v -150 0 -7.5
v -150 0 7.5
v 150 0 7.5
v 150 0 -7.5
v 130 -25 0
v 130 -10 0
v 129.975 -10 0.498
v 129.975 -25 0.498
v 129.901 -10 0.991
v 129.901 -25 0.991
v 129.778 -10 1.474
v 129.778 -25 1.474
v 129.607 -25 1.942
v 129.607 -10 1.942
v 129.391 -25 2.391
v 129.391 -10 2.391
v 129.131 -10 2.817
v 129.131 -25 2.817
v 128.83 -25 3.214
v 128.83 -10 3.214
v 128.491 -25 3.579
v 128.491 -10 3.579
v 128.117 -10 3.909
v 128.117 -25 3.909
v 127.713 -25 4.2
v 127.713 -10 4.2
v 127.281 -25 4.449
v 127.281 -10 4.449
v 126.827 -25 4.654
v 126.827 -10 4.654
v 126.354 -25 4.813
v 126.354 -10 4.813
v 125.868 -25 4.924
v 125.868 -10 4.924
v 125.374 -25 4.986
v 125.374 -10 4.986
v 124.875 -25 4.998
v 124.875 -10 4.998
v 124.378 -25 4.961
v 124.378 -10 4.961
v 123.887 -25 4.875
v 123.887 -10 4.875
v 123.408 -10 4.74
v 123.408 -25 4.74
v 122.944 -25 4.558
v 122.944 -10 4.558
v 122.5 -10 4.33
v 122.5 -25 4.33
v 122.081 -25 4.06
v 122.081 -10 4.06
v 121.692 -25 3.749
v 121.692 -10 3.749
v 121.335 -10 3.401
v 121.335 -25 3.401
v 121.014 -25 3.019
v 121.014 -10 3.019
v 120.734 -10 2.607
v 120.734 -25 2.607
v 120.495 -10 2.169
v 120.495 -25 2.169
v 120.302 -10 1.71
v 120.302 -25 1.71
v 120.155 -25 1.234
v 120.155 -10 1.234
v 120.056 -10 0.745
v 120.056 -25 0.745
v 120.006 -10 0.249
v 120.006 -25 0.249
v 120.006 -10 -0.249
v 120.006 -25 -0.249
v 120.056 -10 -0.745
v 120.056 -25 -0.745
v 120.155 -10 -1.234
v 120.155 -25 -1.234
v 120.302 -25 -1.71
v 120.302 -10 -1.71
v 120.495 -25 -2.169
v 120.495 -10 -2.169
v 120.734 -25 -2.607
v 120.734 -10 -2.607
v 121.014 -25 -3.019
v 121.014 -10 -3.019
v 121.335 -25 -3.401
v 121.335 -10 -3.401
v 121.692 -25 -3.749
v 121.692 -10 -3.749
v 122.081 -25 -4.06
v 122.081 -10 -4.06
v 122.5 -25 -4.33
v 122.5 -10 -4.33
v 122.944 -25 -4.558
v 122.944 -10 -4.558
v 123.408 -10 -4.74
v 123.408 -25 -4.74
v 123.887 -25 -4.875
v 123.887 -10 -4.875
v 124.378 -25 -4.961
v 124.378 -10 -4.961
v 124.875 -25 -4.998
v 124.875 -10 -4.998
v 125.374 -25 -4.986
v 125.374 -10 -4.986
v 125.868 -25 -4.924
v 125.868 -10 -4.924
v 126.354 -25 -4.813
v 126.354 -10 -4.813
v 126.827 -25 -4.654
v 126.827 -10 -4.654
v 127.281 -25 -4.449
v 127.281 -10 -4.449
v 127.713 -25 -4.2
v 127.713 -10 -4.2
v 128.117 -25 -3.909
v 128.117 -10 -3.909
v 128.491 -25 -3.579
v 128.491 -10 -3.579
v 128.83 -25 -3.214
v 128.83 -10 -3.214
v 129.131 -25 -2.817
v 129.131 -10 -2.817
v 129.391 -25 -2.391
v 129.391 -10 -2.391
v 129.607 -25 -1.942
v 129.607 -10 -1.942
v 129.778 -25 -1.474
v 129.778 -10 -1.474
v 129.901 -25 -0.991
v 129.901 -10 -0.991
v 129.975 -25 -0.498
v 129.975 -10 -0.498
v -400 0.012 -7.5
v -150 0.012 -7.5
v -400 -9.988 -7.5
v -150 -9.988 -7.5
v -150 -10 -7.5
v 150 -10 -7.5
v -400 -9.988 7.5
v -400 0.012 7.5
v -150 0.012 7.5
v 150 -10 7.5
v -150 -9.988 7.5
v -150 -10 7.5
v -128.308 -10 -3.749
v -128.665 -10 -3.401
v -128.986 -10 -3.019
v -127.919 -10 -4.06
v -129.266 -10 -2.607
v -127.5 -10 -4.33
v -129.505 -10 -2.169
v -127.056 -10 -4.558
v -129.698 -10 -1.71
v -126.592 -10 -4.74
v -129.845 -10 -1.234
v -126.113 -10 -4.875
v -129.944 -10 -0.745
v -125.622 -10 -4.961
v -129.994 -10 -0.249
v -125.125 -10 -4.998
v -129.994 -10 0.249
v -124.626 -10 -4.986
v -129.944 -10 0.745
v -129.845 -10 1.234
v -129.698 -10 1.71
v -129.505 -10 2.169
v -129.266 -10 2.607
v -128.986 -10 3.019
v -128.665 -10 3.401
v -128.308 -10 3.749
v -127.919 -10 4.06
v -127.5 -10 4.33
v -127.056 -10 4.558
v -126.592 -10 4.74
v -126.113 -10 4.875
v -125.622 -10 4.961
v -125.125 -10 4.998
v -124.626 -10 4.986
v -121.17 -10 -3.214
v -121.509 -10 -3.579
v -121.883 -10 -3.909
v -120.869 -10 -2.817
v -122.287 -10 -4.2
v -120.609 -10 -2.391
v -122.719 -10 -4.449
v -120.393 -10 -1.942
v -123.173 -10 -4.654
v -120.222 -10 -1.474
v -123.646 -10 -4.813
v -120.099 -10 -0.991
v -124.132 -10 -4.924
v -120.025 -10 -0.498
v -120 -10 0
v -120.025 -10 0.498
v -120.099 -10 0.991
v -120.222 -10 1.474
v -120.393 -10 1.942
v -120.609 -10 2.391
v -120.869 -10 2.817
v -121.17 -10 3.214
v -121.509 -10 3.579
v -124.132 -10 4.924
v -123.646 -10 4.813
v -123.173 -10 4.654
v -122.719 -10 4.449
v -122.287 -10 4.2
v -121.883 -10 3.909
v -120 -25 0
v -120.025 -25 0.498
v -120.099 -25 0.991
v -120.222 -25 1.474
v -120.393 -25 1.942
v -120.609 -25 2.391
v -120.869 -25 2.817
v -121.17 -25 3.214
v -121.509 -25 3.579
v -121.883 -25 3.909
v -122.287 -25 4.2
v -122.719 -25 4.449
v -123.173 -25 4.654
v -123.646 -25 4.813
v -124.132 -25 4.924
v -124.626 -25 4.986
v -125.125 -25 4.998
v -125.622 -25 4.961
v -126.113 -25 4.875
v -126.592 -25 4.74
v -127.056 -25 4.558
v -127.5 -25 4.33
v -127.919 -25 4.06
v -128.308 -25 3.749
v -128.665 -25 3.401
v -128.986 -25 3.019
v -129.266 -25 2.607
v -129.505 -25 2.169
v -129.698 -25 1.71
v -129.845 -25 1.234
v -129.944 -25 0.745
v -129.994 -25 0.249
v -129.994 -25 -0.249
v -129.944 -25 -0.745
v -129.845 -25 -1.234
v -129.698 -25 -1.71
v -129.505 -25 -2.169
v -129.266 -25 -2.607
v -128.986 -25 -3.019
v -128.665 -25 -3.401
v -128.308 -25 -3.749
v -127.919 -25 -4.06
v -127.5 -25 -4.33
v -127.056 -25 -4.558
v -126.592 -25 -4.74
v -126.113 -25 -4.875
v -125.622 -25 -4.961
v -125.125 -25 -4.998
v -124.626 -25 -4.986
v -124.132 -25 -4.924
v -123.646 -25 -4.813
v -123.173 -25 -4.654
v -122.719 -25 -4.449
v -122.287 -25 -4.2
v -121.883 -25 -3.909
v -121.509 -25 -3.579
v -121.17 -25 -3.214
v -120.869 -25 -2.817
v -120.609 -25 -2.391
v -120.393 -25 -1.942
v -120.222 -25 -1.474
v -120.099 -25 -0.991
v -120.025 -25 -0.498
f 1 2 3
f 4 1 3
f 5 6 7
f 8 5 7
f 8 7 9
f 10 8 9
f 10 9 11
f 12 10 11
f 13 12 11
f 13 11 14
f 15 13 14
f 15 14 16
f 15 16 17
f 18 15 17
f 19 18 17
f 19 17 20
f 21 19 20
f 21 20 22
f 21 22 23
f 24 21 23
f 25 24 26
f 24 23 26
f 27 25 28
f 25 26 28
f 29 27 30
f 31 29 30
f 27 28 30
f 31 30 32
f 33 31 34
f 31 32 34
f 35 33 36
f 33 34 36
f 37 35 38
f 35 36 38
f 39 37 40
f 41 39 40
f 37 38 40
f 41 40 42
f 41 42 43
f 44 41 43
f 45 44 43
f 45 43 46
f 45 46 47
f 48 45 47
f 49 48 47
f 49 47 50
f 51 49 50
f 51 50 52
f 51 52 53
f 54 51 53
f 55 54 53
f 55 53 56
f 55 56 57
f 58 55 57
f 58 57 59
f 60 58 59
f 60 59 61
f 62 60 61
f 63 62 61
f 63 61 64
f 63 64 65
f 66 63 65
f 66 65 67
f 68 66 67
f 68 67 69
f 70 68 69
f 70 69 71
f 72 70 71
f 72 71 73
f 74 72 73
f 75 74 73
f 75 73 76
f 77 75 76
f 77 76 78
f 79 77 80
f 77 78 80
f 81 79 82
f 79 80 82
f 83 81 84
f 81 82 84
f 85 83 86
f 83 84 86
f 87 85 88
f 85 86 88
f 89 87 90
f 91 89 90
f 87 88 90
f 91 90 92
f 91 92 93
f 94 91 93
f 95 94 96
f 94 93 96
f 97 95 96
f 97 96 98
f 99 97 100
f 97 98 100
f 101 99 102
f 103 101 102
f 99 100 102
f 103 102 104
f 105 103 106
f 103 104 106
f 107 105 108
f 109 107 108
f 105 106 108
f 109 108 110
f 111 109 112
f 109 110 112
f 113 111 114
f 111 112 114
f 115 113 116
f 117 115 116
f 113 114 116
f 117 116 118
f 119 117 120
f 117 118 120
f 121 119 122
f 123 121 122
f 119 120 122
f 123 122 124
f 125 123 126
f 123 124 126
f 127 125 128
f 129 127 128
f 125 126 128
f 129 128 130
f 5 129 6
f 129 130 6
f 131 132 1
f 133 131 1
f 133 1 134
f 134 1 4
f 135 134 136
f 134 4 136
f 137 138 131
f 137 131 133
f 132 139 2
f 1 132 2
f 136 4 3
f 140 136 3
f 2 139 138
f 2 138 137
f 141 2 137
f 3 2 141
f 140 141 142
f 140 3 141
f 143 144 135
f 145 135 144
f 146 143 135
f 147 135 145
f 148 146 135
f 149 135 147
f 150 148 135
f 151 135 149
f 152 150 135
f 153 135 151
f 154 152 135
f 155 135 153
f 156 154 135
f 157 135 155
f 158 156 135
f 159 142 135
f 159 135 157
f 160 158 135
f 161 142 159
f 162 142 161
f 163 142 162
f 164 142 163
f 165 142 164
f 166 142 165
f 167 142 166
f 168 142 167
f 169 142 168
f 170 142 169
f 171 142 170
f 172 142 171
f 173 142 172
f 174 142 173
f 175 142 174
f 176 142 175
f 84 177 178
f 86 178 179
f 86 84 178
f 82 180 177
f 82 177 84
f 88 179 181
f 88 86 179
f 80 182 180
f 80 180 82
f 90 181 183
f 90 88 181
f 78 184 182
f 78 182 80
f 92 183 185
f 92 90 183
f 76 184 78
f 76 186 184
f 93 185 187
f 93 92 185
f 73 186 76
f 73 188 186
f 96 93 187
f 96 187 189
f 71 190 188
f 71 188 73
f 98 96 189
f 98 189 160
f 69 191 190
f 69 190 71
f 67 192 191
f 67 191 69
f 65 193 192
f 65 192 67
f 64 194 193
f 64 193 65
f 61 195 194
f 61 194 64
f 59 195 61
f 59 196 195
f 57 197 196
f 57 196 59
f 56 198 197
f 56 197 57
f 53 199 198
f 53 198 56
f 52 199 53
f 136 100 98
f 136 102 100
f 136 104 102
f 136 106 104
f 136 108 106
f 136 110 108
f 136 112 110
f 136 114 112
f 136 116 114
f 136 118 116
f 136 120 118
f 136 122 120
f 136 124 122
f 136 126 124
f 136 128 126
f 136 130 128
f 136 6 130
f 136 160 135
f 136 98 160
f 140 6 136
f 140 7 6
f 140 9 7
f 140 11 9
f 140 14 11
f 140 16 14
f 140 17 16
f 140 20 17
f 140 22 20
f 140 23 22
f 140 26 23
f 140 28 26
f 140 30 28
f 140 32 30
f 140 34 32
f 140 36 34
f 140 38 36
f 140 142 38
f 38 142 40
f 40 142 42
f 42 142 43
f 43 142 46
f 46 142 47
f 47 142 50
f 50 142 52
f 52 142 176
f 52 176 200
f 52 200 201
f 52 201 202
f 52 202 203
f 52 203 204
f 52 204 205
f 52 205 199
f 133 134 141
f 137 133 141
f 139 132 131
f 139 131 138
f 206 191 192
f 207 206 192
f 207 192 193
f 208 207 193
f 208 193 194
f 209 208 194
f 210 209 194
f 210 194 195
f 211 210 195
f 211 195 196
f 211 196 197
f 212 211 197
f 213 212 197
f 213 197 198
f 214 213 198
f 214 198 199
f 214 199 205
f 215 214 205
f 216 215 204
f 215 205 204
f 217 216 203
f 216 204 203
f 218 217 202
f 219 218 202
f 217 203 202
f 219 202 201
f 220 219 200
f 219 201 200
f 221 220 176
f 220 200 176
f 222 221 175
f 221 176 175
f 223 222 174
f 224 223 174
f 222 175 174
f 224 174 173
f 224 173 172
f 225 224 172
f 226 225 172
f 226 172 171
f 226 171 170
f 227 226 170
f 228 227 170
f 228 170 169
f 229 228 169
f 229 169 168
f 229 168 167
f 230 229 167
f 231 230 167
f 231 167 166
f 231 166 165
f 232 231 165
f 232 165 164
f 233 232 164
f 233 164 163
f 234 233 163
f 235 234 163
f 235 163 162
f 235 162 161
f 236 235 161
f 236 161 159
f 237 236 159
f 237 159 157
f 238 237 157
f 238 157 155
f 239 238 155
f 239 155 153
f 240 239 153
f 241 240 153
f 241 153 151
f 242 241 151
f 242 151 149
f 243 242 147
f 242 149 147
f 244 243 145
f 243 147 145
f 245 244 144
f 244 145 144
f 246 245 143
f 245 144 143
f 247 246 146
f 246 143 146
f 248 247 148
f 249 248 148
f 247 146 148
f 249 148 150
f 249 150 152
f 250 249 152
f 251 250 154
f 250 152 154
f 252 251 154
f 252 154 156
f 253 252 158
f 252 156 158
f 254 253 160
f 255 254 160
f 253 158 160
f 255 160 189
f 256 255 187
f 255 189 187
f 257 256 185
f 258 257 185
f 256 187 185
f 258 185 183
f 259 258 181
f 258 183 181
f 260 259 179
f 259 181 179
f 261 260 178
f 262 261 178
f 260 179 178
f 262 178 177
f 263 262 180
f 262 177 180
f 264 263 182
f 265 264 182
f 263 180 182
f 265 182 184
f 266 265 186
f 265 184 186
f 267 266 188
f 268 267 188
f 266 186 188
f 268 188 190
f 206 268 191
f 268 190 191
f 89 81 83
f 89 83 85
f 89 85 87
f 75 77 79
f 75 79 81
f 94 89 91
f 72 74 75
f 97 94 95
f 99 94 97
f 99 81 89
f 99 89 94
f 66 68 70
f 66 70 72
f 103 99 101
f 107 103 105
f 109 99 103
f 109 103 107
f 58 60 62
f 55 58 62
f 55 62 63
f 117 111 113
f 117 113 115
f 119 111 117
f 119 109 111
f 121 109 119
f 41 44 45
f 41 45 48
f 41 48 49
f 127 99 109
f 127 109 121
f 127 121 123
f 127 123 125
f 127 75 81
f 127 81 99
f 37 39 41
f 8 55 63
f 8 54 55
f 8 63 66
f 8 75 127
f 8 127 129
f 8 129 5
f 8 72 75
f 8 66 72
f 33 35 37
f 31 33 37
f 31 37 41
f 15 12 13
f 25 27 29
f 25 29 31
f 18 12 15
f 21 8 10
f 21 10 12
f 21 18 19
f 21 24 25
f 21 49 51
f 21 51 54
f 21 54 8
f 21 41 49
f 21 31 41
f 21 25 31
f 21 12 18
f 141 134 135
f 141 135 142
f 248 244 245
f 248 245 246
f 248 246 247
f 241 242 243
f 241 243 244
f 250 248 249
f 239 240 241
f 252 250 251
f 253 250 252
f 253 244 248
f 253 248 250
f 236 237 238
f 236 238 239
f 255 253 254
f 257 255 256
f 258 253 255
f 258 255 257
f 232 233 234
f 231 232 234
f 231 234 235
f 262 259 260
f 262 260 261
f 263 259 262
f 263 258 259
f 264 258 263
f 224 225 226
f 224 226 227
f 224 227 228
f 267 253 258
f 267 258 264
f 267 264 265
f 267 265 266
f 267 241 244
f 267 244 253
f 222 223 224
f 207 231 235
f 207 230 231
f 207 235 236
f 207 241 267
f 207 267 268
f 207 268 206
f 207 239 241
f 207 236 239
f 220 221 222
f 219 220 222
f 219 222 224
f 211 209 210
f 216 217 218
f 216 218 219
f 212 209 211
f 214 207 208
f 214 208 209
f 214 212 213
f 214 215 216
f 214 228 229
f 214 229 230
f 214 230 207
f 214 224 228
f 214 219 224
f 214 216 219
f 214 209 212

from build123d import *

# Parameters (mm, degrees)
F0_W     = 300
F0_H     = 15
F0_R     = 5
F1_DEPTH = 10
F2_DEPTH = 25
F4_W     = 10
F4_H     = 15
F5_DEPTH = 250


with BuildPart() as f1:
    # F0 (on Front) → F1 (new body)
    with BuildSketch(Plane.XZ):
        Rectangle(F0_W, F0_H)
        with Locations((-125, 0)):
            Circle(F0_R, mode=Mode.SUBTRACT)
        with Locations((125, 0)):
            Circle(F0_R, mode=Mode.SUBTRACT)
    extrude(amount=F1_DEPTH)

    # F0 (on Front) → F2 (join)
    with BuildSketch(Plane.XZ):
        with Locations((-125, 0)):
            Circle(F0_R)
        with Locations((125, 0)):
            Circle(F0_R)
    extrude(amount=F2_DEPTH)

    # F4 (on offset) → F5 (join)
    with BuildSketch(Plane(origin=(-150, 0, 0), x_dir=(0, -1, 0), z_dir=(-1, 0, 0))):
        with Locations((4.988082091, 0)):
            Rectangle(F4_W, F4_H)
    extrude(amount=F5_DEPTH)


solid = f1.part
